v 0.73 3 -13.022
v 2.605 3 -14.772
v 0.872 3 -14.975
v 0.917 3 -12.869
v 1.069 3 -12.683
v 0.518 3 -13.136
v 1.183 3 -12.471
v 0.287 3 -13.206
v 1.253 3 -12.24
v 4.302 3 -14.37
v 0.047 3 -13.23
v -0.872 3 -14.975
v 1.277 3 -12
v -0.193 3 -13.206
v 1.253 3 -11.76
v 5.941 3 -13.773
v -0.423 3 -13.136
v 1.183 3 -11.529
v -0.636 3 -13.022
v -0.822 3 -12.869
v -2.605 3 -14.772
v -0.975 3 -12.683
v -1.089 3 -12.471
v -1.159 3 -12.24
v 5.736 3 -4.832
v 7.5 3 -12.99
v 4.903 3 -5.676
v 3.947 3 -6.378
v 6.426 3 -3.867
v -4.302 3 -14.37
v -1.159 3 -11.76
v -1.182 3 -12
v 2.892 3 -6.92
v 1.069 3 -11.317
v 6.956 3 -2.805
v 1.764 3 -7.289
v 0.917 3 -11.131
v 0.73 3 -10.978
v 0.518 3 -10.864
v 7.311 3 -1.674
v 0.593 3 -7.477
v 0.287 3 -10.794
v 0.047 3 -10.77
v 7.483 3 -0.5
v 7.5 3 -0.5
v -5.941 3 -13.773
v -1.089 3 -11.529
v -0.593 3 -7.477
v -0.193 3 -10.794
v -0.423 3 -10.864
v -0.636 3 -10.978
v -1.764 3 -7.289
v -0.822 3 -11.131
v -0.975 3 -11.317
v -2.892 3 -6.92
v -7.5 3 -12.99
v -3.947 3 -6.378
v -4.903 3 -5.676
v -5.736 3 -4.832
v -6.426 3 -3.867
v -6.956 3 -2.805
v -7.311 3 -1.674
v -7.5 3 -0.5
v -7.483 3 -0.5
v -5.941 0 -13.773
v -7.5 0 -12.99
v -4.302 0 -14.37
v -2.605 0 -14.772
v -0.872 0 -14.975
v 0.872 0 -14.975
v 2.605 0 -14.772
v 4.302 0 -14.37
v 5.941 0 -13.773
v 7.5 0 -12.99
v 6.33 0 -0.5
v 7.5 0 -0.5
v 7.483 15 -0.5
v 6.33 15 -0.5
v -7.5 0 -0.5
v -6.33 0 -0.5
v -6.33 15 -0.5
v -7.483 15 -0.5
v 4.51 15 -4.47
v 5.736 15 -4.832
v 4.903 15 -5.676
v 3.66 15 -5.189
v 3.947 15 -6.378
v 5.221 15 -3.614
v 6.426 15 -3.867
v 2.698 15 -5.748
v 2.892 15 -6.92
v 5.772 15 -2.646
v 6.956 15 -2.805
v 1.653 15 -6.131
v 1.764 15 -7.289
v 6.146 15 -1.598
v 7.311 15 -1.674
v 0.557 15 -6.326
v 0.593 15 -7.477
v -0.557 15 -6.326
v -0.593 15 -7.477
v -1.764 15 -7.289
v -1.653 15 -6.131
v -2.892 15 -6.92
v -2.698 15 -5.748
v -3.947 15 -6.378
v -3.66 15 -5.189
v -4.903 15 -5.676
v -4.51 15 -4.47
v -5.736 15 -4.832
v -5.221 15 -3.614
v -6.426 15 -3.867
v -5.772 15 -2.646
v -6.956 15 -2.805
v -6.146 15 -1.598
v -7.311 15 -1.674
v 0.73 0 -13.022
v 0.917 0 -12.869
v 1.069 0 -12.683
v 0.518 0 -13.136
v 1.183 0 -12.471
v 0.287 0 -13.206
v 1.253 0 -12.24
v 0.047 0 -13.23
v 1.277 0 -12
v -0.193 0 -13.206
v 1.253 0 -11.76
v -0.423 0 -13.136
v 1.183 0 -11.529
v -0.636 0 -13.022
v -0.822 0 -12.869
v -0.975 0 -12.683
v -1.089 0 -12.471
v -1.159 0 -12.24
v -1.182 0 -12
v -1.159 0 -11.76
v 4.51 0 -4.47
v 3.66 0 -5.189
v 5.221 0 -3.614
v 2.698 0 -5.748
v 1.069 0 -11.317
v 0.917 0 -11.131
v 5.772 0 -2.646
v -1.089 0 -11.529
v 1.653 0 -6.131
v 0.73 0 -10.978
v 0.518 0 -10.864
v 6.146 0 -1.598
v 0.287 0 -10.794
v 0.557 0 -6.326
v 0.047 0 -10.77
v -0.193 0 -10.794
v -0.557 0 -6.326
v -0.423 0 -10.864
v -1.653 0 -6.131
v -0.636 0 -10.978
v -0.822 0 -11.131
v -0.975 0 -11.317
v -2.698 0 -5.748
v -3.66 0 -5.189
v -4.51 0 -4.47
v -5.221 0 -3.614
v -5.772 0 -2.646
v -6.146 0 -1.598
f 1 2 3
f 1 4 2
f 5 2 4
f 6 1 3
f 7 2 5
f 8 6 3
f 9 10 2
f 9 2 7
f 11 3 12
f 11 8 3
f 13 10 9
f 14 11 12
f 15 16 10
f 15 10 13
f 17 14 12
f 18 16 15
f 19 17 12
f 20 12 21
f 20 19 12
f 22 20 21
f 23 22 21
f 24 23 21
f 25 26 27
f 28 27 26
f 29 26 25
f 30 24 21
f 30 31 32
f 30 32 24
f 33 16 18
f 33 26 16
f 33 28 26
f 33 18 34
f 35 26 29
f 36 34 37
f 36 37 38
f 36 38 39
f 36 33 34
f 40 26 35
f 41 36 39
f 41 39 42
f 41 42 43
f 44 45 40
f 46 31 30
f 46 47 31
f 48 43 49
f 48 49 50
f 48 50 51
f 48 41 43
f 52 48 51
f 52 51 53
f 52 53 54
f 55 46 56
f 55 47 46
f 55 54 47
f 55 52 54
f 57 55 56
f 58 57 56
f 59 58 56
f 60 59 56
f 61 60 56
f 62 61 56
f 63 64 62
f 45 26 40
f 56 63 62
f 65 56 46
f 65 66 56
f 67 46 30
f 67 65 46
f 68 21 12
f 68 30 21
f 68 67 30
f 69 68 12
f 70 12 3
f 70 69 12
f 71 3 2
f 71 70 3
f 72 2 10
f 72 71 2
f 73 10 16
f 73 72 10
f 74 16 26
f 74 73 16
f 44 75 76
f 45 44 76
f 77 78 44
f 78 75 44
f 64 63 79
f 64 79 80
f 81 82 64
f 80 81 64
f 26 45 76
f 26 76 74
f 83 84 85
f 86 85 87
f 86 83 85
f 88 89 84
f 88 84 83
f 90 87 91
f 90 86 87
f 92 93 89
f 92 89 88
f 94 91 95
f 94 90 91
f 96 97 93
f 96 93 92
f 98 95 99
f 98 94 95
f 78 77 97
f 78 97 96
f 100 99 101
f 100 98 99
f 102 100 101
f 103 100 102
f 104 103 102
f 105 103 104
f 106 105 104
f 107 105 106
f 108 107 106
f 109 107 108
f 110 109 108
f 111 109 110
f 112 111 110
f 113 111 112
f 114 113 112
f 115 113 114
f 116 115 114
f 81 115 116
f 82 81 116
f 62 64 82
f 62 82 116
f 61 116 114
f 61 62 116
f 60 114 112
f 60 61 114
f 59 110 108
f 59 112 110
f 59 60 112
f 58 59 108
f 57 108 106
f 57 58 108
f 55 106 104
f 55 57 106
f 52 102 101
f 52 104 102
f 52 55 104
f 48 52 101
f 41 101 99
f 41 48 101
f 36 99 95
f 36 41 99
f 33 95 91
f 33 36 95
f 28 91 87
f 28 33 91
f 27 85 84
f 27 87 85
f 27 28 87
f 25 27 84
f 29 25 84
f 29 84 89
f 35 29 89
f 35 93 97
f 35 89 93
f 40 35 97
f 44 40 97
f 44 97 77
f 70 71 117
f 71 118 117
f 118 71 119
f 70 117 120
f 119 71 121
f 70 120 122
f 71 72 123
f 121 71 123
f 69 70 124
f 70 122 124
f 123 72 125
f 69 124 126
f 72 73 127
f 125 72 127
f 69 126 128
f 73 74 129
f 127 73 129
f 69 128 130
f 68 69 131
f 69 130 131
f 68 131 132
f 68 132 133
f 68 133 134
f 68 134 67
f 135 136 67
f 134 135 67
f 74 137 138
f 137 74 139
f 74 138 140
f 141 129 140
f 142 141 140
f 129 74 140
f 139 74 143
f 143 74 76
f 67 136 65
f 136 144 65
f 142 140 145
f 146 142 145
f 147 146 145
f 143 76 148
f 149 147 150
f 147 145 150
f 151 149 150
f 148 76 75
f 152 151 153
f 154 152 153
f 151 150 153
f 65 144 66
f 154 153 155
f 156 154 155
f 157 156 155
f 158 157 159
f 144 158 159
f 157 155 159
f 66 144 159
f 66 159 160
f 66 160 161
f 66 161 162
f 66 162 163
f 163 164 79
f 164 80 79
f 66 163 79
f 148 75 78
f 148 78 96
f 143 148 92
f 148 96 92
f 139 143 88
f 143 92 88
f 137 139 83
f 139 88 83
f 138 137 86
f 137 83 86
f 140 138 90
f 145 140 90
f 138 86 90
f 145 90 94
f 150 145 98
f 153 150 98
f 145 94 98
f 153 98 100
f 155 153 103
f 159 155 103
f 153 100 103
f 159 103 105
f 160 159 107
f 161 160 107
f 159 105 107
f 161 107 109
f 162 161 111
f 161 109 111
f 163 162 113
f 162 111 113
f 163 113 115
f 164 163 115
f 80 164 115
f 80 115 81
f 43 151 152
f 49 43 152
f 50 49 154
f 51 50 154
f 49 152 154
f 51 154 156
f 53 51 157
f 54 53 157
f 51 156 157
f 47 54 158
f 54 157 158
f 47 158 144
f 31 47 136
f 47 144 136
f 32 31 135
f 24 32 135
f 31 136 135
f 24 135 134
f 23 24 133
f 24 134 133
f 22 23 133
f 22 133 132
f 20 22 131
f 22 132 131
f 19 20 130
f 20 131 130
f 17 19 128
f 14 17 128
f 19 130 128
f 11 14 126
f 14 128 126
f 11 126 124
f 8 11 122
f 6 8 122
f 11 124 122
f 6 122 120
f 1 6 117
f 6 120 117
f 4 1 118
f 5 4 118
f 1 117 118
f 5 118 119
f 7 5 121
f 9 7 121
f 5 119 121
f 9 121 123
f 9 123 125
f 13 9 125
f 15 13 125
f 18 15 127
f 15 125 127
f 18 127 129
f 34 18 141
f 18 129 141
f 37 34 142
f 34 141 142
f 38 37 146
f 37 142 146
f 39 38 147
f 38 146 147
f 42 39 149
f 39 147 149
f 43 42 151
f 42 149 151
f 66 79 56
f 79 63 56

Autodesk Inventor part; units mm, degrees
ref_plane "YZ Plane" through (0, 0, 0) normal (1, 0, 0) x (0, 1, 0)
ref_plane "XZ Plane" through (0, 0, 0) normal (0, 1, 0) x (-1, 0, 0)
ref_plane "XY Plane" through (0, 0, 0) normal (0, 0, 1) x (1, 0, 0)
sketch "Sketch1" plane through (0, 0, 0) normal (0, 0, 1) x (1, 0, 0)
  line L0 (-15, 0) -> (-6.35, 0)
  line L1 (-6.35, 0) -> (-6.35, 15)
  line L2 (-6.35, 15) -> (-7.5, 15)
  line L3 (-7.5, 15) -> (-7.5, 3)
  line L4 (-7.5, 3) -> (-15, 3)
  line L5 (-15, 3) -> (-15, 0)
  line L6 (0, -3) -> (0, 18) projected
  point P0 (0, 0)
  dimension "d0" = 3
  dimension "d2" = 15
  dimension "d3" = 6.35
  dimension "d4" = 15
  dimension "d17" = 7.5
  dimension "d18" = 1.15
revolve "Revolution1" add sketch "Sketch1" angle 360 about axis through (0, -10, 0) along (0, 1, 0)
sketch "Sketch2" plane through (0, 3, 0) normal (0, 1, 0) x (1, 0, 0)
  point P0 (0, 0)
  point P1 (0.0472, 12)
  dimension "d6" = 12
hole "Hole1" at (0.0472, 3, -12) direction (0, -1, 0) diameter 2.459 end through all thread size "M3x0.5" class "6H" standard "ISO Metric profile"
sketch "Sketch3" plane through (0, 15, 0) normal (0, 1, 0) x (1, 0, 0)
  line L0 (-15, 0.5) -> (15, 0.5)
  line L1 (15, 0.5) -> (15, -15)
  line L2 (15, -15) -> (-15, -15)
  line L3 (-15, -15) -> (-15, 0.5)
  circle A0 centre (0, 0) radius 15 projected
  line L4 (-15, 0) -> (-7.5, 0)
  line L5 (-7.5, 0) -> (-7.5, 15)
  line L6 (-7.5, 15) -> (-15, 15)
  line L7 (-15, 15) -> (-15, 0)
  circle A1 centre (0, 0) radius 7.5 projected
  line L8 (15, 0) -> (7.5, 0)
  line L9 (7.5, 0) -> (7.5, 15)
  line L10 (7.5, 15) -> (15, 15)
  line L11 (15, 15) -> (15, 0)
  point P0 (14.9917, 0.5)
  point P1 (-14.9917, 0.5)
  point P2 (7.5, 0.5)
  point P3 (-7.5, 0.5)
  point P4 (-7.5, 12.9904)
  dimension "d14" = 0.5
extrude "Extrusion1" cut sketch "Sketch3" against normal through all contours A0 L5 L0 | L0 L5 L4 A0 | A0 L2 L3 | L4 A1 L8 A0 | L0 A1 L5 | A0 L1 L2 | A1 L0 | L9 L10 L11 L0 A0 | A0 L0 L9 | L8 L9 L0 A0 | A1 L0 L9 picked at (-1.4202, -1.7241)
properties part number "BaffleClamp" material "Brass, Soft Yellow"
